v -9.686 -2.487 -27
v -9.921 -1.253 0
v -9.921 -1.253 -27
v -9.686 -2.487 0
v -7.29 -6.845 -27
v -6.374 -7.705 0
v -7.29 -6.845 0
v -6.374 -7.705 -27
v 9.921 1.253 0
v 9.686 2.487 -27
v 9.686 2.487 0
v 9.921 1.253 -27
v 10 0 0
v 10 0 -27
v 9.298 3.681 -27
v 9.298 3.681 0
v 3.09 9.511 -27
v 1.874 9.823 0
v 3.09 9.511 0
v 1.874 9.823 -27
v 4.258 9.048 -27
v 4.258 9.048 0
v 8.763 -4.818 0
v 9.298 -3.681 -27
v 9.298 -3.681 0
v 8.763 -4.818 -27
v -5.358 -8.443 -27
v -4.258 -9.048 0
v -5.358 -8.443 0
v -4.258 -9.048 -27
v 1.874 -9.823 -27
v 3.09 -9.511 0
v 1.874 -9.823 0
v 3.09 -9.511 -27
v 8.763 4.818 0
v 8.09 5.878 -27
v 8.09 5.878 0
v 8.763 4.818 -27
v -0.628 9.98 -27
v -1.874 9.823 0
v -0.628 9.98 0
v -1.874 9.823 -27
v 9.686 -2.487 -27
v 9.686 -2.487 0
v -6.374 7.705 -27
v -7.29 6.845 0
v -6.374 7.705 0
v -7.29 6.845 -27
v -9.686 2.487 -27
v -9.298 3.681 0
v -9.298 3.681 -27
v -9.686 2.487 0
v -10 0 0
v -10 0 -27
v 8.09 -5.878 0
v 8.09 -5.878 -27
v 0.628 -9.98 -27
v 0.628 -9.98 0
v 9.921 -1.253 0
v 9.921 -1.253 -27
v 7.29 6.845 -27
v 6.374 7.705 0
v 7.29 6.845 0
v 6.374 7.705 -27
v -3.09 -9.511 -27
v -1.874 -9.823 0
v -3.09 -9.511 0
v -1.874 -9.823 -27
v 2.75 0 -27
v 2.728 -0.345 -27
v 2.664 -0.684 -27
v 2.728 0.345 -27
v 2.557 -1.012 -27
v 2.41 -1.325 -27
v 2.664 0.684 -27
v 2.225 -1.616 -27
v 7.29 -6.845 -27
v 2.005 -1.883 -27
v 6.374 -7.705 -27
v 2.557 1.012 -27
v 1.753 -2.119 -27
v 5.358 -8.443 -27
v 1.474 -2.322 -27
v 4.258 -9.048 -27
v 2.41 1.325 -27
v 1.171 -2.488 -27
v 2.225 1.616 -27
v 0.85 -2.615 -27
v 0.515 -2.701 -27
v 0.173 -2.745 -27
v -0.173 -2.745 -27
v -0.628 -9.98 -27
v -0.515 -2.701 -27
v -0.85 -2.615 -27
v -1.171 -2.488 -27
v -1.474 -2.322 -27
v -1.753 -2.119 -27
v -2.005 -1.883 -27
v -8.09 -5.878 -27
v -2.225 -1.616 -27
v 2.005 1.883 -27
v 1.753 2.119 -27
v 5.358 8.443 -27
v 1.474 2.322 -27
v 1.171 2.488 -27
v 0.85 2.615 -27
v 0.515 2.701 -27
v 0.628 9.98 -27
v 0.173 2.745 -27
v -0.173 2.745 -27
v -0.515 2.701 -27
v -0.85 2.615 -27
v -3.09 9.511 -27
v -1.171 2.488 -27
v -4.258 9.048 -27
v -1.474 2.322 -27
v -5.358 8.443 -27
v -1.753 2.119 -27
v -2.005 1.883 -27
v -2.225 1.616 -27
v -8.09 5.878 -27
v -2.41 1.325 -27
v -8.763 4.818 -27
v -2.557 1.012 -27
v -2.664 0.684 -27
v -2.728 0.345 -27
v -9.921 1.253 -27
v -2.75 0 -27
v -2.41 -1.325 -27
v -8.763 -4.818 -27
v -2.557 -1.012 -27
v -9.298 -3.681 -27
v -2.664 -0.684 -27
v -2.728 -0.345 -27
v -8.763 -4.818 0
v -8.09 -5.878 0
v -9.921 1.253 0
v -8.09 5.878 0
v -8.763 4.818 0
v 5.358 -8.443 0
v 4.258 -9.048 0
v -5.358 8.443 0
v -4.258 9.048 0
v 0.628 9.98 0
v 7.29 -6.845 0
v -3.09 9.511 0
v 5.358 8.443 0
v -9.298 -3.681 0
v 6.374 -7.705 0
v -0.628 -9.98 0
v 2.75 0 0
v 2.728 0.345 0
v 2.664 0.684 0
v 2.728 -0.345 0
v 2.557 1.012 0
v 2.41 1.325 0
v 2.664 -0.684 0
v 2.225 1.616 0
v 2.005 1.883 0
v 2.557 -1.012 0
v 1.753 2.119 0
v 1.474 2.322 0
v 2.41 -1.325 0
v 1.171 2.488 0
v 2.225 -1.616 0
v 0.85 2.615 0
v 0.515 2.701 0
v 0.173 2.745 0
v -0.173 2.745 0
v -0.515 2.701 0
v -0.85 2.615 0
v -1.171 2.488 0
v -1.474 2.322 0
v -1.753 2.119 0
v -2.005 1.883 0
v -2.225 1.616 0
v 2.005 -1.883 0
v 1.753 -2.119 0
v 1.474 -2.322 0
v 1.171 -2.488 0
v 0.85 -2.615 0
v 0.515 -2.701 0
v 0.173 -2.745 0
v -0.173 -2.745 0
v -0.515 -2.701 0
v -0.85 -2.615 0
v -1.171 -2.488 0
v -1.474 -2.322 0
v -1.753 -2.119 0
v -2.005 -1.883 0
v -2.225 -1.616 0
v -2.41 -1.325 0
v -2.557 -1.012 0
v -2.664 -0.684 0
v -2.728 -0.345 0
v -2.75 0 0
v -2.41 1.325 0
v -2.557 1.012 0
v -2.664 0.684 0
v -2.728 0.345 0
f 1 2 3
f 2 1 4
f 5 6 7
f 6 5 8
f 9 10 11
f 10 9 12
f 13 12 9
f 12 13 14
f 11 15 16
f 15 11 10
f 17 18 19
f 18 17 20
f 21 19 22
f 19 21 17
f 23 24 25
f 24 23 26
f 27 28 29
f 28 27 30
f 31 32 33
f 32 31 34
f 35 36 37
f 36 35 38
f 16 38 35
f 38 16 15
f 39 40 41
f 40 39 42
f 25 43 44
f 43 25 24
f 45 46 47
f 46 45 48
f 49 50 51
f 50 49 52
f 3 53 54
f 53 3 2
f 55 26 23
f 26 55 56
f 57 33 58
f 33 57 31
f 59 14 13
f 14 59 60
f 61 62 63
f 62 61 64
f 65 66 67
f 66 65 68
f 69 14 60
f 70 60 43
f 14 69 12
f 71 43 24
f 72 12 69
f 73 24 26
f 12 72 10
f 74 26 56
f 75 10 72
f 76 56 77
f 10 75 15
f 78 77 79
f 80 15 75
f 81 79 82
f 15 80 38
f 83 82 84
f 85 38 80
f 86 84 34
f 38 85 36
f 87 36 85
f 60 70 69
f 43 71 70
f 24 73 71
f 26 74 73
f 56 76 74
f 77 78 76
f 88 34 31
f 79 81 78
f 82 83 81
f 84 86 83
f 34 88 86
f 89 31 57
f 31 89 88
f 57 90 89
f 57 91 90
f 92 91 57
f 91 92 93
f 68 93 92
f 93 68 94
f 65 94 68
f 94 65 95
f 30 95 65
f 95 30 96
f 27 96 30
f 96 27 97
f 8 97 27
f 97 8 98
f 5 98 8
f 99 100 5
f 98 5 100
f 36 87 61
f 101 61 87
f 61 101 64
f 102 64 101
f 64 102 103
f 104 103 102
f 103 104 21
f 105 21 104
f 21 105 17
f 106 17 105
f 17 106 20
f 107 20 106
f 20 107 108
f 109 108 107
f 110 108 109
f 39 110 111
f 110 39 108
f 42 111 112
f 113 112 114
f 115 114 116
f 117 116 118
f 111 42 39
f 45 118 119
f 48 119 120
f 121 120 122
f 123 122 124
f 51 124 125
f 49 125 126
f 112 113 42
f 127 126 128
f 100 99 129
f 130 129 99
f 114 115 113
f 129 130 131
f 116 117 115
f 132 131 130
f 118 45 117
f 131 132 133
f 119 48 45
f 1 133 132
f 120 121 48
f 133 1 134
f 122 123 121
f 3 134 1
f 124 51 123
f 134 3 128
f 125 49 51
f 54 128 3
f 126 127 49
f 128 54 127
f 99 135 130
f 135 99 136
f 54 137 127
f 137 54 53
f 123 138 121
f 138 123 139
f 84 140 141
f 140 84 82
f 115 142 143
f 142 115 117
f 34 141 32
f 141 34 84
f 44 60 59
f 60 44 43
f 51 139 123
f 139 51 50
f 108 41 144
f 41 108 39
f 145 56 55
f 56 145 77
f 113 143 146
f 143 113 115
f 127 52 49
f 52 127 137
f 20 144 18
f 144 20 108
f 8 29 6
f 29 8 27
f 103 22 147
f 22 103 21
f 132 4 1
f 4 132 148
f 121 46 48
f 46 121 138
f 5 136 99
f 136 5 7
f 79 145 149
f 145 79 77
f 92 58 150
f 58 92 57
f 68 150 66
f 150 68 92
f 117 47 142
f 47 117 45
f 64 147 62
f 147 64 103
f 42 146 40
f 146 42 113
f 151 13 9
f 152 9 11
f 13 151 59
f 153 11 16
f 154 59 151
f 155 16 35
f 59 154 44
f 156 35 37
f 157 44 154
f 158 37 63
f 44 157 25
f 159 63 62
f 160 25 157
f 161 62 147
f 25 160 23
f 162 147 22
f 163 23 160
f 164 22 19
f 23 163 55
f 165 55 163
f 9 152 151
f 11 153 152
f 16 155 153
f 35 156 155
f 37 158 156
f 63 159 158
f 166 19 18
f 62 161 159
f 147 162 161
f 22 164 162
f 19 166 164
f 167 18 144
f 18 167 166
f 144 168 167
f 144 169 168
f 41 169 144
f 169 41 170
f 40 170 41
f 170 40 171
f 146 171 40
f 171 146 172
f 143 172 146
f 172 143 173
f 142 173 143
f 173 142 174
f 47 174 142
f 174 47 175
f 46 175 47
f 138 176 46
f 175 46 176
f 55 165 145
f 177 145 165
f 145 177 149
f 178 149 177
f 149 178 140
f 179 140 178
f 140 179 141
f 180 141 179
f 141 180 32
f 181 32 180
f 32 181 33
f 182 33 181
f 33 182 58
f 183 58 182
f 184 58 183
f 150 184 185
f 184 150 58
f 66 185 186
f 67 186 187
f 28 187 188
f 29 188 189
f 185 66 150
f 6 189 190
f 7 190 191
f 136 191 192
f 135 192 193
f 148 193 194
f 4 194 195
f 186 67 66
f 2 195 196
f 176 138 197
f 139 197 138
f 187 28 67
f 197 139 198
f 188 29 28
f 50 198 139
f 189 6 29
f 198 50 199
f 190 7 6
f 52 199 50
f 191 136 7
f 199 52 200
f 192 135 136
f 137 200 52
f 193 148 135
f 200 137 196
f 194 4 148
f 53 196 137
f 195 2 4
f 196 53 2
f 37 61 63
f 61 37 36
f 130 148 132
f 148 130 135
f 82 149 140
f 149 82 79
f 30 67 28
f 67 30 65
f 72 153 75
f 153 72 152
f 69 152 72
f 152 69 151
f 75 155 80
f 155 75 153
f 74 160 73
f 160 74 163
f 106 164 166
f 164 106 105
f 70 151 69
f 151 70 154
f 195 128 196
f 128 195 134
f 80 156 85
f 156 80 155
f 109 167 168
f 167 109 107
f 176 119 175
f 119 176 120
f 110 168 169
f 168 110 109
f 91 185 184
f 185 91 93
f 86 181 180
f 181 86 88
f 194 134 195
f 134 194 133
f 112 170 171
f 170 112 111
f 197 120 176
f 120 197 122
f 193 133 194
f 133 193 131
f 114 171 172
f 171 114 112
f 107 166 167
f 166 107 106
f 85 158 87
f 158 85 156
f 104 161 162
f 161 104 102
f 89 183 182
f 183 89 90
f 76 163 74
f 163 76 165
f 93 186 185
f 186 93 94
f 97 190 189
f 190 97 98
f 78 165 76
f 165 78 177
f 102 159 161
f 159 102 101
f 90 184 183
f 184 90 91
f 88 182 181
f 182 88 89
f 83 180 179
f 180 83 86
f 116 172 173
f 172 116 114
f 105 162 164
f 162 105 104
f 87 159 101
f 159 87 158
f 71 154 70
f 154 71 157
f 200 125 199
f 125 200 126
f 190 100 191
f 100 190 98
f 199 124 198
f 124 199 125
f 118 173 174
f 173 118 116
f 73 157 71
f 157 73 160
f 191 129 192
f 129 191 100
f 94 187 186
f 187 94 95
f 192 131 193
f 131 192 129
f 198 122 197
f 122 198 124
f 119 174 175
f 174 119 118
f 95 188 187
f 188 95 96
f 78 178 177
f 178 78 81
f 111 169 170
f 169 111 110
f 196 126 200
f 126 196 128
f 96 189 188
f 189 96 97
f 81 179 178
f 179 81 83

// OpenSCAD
$fn = 50;


difference() {
	union() {
		translate(v = [0, 0, -27.0000000000]) {
			cylinder(h = 27, r = 10.0000000000);
		}
		cylinder(h = 0, r = 19.0000000000);
	}
	union() {
		#translate(v = [0, 0, -27]) {
			cylinder(h = 27, r = 2.7500000000);
		}
	}
}
